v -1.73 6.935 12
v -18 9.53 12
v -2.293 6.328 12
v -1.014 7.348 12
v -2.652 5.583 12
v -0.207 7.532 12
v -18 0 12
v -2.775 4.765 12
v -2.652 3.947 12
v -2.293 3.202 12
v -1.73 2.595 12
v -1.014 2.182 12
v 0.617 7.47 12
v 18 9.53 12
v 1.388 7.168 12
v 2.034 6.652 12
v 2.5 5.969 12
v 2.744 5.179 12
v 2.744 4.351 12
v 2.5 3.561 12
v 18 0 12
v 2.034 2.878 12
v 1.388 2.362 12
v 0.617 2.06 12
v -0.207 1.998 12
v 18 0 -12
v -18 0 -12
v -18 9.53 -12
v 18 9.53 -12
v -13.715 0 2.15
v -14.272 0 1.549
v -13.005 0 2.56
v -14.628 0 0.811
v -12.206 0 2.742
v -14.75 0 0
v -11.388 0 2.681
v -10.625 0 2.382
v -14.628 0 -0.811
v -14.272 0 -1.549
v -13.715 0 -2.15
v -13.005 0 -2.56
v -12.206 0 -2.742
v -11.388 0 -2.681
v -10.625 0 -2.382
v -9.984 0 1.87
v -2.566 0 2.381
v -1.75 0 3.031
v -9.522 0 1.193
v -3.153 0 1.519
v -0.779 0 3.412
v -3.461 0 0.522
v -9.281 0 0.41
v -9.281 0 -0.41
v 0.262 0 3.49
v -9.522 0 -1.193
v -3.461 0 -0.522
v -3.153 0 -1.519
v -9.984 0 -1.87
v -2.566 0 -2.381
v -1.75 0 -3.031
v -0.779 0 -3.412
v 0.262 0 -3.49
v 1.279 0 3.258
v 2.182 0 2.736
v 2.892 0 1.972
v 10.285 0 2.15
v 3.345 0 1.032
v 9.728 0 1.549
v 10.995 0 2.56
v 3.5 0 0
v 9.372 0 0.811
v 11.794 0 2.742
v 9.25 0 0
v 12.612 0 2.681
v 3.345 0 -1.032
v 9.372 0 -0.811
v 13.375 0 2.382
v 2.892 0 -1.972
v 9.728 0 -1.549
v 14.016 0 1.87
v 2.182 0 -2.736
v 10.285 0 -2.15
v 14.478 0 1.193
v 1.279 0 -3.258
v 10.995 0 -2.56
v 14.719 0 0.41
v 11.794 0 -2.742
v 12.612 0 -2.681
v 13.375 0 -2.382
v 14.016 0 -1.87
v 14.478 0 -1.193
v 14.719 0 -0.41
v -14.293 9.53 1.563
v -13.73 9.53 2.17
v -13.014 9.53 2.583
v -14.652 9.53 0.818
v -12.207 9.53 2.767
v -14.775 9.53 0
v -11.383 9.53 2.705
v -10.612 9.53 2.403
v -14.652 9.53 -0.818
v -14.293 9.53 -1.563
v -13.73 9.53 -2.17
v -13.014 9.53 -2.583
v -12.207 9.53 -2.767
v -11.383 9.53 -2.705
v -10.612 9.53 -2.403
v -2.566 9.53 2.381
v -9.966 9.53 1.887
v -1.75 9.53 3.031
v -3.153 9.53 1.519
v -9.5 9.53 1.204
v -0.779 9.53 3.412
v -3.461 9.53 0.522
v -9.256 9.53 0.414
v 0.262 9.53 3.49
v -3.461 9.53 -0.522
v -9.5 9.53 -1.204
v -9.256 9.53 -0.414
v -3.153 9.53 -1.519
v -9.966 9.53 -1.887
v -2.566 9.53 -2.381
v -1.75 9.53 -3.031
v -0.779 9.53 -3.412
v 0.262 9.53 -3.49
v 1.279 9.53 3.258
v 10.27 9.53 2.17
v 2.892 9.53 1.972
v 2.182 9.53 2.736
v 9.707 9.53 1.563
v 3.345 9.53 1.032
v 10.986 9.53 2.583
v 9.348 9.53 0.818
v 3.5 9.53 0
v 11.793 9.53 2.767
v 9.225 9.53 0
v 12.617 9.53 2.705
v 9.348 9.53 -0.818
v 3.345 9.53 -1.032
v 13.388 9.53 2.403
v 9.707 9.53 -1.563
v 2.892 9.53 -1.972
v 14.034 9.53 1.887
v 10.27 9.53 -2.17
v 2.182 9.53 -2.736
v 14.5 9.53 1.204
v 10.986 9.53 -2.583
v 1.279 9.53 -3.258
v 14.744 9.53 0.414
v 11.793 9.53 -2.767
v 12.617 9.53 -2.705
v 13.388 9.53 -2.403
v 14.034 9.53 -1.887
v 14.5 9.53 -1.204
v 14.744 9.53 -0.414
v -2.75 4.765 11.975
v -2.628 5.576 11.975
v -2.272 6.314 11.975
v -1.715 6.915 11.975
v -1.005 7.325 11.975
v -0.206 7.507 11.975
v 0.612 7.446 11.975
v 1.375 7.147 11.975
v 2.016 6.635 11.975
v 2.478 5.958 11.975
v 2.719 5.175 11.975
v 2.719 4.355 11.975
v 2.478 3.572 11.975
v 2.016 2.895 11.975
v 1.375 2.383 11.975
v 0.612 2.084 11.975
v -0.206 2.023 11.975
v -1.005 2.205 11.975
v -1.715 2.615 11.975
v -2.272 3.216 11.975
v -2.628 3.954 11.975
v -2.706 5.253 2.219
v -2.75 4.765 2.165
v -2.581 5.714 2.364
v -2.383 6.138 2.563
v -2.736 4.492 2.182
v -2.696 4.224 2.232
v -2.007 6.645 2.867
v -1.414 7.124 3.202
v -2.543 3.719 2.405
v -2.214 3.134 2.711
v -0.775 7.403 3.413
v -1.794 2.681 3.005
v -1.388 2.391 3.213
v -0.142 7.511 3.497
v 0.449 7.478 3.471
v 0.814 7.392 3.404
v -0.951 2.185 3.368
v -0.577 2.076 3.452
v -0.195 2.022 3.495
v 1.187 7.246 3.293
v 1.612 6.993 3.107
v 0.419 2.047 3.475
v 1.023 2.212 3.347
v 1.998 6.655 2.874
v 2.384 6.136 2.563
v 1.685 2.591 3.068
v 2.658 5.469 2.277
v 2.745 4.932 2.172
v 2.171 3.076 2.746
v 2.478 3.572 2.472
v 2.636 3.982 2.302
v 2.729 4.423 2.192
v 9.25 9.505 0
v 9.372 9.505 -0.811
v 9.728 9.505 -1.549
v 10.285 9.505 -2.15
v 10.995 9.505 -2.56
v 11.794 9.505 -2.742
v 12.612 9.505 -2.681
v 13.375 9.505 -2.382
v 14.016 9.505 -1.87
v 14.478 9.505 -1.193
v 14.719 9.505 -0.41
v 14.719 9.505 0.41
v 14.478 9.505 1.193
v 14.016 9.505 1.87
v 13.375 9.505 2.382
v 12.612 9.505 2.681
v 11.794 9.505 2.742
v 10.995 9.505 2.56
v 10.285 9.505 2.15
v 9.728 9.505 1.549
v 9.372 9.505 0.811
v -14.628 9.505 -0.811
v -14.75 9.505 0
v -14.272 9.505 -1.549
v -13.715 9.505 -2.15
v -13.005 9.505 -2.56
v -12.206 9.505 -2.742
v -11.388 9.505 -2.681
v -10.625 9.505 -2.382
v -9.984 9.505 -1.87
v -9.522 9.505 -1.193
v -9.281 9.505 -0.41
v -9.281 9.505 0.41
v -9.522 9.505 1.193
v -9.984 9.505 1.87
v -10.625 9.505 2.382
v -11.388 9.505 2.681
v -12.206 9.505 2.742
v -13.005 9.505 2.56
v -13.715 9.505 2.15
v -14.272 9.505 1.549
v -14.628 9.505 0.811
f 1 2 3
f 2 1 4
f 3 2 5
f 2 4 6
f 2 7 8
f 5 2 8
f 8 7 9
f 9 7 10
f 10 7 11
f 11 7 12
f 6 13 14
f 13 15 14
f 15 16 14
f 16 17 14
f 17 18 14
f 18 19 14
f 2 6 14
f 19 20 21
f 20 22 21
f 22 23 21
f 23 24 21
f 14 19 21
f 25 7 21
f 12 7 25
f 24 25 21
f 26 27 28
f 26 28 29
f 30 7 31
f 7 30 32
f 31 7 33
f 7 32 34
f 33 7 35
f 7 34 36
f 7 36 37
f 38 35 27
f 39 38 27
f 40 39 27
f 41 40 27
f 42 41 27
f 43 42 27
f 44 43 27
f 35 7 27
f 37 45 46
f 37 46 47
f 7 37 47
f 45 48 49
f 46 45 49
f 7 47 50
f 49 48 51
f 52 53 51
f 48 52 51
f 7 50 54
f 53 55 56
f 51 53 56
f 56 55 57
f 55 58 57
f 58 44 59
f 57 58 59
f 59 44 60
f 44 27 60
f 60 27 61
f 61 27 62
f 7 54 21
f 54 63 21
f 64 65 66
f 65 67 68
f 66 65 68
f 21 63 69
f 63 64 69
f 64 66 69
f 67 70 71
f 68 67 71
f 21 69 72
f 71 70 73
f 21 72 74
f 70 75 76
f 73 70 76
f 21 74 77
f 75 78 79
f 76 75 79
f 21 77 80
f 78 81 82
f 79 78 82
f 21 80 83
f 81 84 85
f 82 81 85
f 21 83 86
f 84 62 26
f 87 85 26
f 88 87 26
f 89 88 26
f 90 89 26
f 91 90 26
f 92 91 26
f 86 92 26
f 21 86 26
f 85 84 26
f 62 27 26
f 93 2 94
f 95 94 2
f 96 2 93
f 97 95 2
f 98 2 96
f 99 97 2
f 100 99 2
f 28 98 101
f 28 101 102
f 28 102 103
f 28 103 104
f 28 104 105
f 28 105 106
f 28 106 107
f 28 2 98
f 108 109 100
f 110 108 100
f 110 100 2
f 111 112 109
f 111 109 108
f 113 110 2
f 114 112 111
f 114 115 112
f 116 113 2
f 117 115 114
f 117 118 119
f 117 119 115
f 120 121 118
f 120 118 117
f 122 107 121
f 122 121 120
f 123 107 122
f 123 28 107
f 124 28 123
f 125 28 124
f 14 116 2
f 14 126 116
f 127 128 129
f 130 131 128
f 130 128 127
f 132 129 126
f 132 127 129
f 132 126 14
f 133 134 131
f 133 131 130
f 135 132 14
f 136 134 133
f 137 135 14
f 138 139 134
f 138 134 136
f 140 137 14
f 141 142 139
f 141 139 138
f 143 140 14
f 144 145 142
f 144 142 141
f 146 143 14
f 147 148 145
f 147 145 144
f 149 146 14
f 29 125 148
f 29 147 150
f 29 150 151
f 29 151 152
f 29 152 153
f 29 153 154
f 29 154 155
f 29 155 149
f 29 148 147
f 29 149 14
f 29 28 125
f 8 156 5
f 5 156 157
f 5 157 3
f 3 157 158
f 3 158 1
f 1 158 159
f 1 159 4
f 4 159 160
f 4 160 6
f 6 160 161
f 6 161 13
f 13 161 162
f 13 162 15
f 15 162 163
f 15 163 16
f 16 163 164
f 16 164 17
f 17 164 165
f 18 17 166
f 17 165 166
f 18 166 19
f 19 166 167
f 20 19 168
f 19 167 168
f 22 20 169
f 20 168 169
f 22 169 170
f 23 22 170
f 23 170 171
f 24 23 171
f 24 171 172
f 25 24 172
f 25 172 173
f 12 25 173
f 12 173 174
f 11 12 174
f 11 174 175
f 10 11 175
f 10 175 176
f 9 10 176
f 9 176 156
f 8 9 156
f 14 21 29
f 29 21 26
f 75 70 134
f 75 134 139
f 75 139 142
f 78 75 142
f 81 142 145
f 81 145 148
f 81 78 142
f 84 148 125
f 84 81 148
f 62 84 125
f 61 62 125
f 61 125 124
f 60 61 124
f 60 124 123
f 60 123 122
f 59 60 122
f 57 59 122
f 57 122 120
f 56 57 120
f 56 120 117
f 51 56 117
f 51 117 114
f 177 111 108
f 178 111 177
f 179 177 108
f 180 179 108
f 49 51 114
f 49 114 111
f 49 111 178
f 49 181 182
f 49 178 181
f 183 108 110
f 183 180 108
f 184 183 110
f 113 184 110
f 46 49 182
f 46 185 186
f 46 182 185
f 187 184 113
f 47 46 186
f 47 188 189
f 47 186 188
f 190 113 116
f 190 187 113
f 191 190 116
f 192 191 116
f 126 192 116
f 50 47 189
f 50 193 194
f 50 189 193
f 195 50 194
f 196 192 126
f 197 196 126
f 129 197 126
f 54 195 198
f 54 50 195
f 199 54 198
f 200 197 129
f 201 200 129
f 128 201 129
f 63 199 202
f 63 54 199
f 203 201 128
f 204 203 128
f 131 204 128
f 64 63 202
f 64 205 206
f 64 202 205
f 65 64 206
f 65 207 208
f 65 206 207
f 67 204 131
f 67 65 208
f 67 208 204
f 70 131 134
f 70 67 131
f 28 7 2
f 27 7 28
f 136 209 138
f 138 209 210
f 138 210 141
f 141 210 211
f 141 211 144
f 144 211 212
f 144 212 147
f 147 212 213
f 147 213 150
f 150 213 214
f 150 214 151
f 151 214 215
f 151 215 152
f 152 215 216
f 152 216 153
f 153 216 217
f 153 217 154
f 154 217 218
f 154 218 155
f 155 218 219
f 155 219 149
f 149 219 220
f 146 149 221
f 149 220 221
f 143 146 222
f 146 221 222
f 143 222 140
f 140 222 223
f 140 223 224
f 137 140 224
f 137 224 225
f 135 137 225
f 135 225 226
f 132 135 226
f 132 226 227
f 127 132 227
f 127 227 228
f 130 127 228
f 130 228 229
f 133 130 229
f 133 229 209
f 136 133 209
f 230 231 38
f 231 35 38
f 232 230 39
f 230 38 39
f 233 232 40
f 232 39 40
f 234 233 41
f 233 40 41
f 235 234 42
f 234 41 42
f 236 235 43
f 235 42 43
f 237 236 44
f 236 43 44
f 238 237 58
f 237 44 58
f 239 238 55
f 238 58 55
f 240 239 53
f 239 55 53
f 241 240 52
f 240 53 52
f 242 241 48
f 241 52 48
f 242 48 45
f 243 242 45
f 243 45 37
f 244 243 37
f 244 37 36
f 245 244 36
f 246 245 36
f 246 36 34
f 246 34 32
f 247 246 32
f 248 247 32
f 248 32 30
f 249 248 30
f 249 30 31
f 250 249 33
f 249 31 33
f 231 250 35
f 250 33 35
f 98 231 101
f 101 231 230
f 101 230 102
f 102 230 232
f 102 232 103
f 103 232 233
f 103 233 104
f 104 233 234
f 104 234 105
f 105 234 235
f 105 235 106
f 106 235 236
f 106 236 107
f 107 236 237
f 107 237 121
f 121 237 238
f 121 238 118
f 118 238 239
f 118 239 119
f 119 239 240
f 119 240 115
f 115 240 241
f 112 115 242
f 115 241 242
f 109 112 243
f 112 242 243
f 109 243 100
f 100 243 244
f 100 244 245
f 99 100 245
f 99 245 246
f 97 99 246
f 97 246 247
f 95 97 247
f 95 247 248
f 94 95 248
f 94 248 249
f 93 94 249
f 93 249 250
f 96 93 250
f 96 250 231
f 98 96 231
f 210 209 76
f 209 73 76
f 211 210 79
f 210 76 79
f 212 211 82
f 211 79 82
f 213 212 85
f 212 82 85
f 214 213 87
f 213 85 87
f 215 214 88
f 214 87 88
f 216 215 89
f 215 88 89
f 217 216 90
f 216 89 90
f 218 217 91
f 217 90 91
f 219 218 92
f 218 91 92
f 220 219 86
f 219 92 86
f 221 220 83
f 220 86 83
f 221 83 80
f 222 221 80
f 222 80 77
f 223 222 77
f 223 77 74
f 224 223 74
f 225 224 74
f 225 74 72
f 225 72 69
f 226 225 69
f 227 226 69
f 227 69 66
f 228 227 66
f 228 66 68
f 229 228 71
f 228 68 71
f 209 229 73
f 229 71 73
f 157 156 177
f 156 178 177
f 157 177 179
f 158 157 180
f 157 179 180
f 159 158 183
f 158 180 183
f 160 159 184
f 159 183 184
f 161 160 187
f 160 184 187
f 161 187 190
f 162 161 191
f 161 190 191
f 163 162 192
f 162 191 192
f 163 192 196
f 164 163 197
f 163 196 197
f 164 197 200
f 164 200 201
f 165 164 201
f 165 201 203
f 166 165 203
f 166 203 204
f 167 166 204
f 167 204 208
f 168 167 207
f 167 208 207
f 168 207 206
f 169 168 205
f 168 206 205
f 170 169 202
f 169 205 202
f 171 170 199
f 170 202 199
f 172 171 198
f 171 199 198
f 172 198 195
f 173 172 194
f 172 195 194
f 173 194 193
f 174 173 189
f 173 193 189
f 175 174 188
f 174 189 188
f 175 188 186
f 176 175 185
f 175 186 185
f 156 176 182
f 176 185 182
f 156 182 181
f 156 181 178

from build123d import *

# Parameters (mm, degrees)
SKETCH1_W                      = 36
SKETCH1_H                      = 24
SKETCH1_R                      = 3.5
BOSS_EXTRUDE1_DEPTH            = 9.53
M5_CLEARANCE_HOLE1_D           = 5.5
M5_CLEARANCE_HOLE1_DEPTH       = 13
M5_CLEARANCE_HOLE1_CSINK_D     = 5.55
M5_CLEARANCE_HOLE1_CSINK_ANGLE = 90
M5_CLEARANCE_HOLE1_TIP         = 1.652366702
M5_CLEARANCE_HOLE2_D           = 5.5
M5_CLEARANCE_HOLE2_DEPTH       = 13
M5_CLEARANCE_HOLE2_CSINK_D     = 5.55
M5_CLEARANCE_HOLE2_CSINK_ANGLE = 90
M5_CLEARANCE_HOLE2_TIP         = 1.652366702


with BuildPart() as part:
    # Sketch1 → Boss-Extrude1 (new body)
    with BuildSketch(Plane(origin=(0, 0, 0), x_dir=(1, 0, 0), z_dir=(0, 1, 0))):
        Rectangle(SKETCH1_W, SKETCH1_H)
        Circle(SKETCH1_R, mode=Mode.SUBTRACT)
    extrude(amount=BOSS_EXTRUDE1_DEPTH)

    # M5 Clearance Hole1
    with Locations(Plane.XY.offset(12)):
        with Locations((0, 4.765)):
            CounterSinkHole(M5_CLEARANCE_HOLE1_D / 2, M5_CLEARANCE_HOLE1_CSINK_D / 2, depth=M5_CLEARANCE_HOLE1_DEPTH, counter_sink_angle=M5_CLEARANCE_HOLE1_CSINK_ANGLE)
            with Locations((0, 0, -(M5_CLEARANCE_HOLE1_DEPTH + M5_CLEARANCE_HOLE1_TIP / 2))):  # 118° drill point
                Cone(0, M5_CLEARANCE_HOLE1_D / 2, M5_CLEARANCE_HOLE1_TIP, mode=Mode.SUBTRACT)

    # M5 Clearance Hole2
    with Locations(Plane(origin=(0, 9.53, 0), x_dir=(1, 0, 0), z_dir=(0, 1, 0))):
        with Locations((12, 0), (-12, 0)):
            CounterSinkHole(M5_CLEARANCE_HOLE2_D / 2, M5_CLEARANCE_HOLE2_CSINK_D / 2, depth=M5_CLEARANCE_HOLE2_DEPTH, counter_sink_angle=M5_CLEARANCE_HOLE2_CSINK_ANGLE)
            with Locations((0, 0, -(M5_CLEARANCE_HOLE2_DEPTH + M5_CLEARANCE_HOLE2_TIP / 2))):  # 118° drill point
                Cone(0, M5_CLEARANCE_HOLE2_D / 2, M5_CLEARANCE_HOLE2_TIP, mode=Mode.SUBTRACT)


solid = part.part
